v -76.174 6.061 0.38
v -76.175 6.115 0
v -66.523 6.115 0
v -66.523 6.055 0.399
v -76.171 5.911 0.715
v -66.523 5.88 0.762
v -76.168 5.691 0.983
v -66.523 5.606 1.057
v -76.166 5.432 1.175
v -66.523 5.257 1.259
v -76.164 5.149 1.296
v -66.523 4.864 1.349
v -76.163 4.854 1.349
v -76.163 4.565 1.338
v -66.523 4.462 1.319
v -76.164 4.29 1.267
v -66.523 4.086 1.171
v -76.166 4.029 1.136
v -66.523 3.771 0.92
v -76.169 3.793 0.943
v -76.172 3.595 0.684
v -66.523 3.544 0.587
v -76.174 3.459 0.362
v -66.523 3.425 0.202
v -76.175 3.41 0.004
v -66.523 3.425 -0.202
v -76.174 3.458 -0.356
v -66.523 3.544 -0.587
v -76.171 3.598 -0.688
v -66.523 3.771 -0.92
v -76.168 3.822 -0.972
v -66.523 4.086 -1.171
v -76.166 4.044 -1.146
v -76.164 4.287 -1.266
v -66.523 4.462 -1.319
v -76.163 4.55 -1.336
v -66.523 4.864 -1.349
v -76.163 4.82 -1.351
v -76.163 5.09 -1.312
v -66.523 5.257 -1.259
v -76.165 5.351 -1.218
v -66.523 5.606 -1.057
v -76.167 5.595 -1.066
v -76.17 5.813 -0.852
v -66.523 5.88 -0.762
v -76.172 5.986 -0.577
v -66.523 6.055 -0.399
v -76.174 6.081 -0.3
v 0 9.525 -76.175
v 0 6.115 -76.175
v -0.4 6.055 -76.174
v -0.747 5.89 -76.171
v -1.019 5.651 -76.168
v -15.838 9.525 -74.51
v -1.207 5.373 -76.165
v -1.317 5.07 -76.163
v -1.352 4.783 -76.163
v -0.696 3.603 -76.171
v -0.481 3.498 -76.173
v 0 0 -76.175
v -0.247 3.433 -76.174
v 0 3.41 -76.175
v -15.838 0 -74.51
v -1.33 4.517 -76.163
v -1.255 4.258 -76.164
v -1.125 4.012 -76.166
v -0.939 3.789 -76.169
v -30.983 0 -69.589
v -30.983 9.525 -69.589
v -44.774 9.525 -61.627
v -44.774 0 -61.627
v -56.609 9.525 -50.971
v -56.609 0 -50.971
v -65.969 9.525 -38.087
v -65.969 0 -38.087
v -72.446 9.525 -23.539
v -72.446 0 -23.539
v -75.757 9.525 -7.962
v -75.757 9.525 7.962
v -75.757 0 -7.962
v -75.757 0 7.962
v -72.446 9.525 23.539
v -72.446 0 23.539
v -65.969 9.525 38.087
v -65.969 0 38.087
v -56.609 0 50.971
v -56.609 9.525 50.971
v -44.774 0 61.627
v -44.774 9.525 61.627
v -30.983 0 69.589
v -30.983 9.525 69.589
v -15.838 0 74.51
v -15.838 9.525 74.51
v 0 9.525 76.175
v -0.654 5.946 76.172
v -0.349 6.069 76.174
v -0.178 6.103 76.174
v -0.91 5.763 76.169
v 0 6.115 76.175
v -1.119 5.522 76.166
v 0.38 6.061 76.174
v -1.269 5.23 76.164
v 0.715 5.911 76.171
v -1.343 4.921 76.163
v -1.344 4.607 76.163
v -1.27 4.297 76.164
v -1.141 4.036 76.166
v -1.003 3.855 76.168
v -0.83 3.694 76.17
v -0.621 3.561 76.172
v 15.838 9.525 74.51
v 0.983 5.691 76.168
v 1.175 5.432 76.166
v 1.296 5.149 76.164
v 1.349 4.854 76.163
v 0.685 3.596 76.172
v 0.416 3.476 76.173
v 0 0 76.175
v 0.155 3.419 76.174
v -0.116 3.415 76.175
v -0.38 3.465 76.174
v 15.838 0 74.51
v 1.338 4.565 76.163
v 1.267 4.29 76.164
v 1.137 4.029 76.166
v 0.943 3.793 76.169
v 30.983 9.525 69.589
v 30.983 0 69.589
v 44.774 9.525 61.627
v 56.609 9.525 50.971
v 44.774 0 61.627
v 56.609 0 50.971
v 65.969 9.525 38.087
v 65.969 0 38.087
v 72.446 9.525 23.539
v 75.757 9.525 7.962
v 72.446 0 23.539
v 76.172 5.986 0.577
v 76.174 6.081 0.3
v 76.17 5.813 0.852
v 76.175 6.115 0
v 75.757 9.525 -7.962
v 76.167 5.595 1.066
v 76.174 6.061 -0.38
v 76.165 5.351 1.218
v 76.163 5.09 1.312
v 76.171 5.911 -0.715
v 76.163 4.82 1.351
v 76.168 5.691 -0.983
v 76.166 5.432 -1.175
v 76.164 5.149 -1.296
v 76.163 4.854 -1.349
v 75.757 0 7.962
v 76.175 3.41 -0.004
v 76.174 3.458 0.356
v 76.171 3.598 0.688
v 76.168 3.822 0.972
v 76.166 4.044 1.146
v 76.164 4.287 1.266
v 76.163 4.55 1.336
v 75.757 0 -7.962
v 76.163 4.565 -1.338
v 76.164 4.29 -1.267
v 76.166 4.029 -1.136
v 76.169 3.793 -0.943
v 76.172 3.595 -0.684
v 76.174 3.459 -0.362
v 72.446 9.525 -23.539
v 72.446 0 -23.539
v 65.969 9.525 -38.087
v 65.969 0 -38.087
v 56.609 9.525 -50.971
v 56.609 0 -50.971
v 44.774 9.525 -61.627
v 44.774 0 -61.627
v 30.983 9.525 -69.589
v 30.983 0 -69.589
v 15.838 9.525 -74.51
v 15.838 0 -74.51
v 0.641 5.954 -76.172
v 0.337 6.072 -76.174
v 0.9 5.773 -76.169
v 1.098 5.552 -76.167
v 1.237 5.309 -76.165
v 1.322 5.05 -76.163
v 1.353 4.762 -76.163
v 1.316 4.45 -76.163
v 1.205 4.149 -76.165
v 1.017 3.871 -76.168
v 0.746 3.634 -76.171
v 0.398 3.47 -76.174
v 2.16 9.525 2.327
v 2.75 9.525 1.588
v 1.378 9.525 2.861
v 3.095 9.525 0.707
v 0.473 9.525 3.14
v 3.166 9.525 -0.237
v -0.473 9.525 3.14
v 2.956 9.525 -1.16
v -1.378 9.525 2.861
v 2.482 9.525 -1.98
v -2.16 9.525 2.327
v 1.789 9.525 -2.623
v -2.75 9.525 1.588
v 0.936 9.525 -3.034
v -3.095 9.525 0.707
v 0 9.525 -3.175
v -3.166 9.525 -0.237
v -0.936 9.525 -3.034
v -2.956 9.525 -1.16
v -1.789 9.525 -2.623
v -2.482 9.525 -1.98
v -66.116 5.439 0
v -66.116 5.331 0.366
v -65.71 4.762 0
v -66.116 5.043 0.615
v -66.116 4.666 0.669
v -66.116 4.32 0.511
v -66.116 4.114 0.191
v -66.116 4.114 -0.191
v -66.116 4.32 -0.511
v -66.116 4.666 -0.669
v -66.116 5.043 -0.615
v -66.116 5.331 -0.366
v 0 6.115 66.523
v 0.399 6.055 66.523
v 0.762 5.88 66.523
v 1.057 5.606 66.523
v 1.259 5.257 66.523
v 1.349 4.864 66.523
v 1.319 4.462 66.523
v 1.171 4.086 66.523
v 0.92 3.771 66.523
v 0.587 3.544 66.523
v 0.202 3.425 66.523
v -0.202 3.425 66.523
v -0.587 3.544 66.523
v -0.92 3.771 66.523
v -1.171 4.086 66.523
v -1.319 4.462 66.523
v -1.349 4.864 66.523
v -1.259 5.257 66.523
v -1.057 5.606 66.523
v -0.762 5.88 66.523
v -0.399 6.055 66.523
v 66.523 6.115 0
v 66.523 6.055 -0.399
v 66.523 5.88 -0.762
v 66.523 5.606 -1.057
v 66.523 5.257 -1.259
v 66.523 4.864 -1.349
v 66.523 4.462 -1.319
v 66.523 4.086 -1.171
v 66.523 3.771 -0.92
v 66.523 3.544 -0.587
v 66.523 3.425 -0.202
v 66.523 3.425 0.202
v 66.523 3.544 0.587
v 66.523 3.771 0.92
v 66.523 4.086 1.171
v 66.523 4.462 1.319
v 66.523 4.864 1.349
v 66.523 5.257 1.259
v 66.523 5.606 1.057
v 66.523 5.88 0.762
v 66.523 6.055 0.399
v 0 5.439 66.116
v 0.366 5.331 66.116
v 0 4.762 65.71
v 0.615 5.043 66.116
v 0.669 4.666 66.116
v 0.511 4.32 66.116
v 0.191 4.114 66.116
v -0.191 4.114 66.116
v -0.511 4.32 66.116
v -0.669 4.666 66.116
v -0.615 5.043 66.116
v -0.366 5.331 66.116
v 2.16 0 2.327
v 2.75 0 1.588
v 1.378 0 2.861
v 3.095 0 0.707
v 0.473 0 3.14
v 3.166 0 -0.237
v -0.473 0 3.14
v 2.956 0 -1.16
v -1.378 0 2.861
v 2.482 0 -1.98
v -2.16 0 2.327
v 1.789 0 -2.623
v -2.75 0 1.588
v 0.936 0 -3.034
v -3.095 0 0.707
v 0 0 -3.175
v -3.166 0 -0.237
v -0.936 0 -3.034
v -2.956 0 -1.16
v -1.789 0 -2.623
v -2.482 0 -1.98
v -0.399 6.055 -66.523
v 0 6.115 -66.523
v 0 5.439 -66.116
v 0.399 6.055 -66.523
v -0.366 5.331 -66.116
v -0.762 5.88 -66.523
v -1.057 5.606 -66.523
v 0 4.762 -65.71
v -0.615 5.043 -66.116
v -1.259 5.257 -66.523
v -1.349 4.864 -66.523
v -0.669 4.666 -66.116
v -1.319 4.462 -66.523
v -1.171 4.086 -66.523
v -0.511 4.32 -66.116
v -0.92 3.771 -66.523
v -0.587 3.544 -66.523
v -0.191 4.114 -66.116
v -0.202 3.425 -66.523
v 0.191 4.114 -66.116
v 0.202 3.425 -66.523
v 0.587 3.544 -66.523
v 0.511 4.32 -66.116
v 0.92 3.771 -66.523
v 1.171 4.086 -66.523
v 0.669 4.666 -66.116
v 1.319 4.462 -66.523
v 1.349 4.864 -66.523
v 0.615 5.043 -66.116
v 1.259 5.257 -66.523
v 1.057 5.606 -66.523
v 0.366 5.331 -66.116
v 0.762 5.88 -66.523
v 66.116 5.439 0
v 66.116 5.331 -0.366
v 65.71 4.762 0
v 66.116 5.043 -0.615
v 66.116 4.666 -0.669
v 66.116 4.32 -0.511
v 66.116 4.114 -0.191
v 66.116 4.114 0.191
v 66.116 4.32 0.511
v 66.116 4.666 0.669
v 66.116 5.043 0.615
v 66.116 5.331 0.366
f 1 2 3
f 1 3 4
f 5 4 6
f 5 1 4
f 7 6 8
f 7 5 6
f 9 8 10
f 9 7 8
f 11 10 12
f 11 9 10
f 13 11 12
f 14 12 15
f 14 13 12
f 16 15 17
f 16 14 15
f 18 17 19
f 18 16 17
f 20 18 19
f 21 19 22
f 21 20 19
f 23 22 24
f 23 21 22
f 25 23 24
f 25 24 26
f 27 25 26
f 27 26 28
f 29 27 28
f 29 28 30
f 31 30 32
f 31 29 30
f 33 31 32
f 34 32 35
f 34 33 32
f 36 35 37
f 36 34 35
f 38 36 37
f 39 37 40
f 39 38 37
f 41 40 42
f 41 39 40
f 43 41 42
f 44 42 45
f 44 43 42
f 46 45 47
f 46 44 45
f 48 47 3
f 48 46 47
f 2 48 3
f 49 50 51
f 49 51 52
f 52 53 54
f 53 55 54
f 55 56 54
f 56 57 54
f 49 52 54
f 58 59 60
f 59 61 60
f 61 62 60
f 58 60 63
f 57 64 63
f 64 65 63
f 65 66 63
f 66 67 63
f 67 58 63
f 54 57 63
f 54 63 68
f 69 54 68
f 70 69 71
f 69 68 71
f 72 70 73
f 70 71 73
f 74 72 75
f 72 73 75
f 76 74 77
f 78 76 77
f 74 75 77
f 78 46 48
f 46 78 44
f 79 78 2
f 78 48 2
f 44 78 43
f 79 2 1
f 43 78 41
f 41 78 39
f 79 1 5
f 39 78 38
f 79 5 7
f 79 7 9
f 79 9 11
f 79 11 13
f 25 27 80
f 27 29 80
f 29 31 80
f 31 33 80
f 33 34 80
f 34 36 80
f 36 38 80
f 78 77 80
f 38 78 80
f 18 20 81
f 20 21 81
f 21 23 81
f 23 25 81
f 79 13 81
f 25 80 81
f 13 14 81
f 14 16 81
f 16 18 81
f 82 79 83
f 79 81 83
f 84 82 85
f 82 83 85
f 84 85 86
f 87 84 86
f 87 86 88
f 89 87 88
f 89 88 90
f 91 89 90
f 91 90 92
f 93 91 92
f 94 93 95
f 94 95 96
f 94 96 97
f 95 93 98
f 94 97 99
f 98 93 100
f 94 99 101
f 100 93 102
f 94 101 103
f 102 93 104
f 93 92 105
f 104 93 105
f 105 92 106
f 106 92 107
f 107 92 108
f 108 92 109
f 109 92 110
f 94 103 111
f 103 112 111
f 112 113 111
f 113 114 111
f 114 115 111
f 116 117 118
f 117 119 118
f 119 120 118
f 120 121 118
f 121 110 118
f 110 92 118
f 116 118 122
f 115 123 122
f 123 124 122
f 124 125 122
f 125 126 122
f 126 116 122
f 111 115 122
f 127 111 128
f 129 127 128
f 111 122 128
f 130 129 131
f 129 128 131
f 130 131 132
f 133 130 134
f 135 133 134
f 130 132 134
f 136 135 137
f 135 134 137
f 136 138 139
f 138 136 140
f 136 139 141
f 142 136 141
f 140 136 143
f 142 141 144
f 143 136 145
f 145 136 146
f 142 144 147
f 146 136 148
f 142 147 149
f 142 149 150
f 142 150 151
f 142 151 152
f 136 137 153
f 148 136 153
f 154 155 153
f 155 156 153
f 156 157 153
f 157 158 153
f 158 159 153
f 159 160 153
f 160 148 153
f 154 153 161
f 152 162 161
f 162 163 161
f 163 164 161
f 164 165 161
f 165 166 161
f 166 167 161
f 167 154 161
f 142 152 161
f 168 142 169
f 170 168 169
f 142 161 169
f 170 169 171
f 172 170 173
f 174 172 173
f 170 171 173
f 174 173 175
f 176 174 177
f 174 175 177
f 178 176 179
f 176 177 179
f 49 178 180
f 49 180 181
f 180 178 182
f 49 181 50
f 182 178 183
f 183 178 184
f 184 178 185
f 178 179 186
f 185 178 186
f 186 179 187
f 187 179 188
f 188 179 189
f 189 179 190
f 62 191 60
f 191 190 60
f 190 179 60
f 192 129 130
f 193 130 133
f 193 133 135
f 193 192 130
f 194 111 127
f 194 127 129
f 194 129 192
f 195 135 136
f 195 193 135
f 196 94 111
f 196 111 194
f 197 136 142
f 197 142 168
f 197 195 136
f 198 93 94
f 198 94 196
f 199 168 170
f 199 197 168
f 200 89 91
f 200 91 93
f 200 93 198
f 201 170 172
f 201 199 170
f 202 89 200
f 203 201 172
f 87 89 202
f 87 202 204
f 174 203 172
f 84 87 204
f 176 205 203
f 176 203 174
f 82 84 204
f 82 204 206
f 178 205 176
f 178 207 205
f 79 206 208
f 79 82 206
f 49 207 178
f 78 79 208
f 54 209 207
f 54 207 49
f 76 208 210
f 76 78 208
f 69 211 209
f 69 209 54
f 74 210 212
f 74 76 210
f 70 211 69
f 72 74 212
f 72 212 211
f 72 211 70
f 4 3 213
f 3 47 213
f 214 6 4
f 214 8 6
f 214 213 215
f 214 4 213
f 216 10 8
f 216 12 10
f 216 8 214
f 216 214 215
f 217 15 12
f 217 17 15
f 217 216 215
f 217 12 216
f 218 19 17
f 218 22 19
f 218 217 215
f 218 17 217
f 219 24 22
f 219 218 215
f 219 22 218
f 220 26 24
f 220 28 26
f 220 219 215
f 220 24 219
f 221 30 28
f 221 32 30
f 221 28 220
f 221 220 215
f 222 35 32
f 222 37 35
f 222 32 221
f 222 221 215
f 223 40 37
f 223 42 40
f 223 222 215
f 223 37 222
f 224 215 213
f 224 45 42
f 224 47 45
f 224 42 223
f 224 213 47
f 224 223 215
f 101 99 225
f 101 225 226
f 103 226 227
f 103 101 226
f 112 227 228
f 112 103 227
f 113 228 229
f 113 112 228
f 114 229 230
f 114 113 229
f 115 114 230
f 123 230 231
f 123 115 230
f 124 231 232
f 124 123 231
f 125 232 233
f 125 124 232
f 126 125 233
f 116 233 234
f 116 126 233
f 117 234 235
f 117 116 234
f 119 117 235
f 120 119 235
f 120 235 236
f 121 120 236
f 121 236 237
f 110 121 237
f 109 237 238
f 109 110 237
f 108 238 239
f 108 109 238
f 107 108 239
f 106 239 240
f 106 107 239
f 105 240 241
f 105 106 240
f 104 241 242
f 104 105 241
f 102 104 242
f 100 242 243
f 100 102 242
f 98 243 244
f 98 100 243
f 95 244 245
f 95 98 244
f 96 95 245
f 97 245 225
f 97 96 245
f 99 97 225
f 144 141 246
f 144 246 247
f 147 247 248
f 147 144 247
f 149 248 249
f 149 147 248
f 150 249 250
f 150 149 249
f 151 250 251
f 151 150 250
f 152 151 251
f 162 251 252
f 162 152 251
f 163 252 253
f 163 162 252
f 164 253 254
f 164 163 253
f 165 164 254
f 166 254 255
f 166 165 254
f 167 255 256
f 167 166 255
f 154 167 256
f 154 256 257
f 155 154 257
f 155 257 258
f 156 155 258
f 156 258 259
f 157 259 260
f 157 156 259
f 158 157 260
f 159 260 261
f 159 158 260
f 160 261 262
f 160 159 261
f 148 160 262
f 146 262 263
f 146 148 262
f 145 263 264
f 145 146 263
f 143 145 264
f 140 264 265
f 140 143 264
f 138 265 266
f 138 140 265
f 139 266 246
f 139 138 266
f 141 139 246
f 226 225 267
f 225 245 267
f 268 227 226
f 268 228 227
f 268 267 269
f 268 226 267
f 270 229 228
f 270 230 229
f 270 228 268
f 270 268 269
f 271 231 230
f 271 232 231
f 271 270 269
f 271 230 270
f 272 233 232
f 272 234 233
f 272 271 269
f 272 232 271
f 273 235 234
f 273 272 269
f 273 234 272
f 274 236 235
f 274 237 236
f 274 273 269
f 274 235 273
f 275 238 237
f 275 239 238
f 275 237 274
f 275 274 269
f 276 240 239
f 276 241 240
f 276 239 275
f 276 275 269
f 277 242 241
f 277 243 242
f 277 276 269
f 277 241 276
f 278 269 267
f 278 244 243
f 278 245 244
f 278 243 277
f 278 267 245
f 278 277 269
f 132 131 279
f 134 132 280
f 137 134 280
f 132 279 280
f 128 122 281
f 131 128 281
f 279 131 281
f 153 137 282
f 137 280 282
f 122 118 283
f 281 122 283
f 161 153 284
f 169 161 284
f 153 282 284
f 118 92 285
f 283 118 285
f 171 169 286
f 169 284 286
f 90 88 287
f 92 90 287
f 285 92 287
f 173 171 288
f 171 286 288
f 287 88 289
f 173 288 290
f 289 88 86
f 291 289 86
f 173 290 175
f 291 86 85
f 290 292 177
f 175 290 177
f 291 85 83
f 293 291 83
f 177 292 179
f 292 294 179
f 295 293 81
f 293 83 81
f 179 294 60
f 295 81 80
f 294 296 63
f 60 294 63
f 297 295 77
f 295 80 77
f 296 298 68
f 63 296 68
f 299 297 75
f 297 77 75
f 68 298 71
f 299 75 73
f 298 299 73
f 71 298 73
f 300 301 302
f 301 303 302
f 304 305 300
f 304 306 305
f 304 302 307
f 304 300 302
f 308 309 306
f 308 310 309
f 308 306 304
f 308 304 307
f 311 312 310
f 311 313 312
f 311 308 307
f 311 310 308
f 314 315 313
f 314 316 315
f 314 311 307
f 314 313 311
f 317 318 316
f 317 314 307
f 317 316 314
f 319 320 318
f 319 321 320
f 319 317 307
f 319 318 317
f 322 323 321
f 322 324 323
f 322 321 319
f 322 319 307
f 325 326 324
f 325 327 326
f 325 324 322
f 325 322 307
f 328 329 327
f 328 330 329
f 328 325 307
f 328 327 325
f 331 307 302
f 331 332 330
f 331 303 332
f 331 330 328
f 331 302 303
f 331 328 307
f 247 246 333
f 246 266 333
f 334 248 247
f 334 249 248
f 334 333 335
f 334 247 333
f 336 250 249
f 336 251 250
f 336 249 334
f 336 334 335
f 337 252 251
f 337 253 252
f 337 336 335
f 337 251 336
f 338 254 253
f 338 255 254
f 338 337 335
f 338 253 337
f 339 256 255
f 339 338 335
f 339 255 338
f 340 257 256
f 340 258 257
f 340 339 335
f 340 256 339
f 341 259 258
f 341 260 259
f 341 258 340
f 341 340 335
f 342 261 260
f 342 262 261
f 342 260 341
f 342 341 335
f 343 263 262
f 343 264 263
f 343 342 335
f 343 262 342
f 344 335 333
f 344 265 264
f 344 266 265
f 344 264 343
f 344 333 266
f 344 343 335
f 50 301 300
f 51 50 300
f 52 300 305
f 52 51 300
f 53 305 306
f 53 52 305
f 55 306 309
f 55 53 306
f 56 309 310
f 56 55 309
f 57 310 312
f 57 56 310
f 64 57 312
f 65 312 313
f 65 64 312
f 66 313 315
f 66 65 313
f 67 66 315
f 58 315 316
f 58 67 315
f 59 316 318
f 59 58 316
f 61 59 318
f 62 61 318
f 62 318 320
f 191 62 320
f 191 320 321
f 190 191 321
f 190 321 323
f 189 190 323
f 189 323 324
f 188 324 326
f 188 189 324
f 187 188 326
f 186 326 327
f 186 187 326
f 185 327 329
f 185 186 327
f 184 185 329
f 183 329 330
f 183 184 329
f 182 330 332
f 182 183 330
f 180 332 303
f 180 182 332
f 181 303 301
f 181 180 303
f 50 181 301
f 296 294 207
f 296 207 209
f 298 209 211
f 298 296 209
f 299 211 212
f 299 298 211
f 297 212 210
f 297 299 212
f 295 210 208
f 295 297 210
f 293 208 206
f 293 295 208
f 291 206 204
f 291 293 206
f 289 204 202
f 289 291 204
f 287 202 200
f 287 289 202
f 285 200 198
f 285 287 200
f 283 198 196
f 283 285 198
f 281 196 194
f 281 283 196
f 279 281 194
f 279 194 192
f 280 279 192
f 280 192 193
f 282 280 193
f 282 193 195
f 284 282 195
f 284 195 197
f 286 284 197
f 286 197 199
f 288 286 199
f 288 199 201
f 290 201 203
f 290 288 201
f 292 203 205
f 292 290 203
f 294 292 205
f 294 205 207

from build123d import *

# Parameters (mm, degrees)
SKETCH1_R           = 76.1746
SKETCH1_R_2         = 3.175
BOSS_EXTRUDE1_DEPTH = 9.525
CIRPATTERN1_COUNT   = 4


with BuildPart() as part:
    # Sketch1 → Boss-Extrude1 (new body)
    with BuildSketch(Plane(origin=(0, 0, 0), x_dir=(1, 0, 0), z_dir=(0, 1, 0))):
        with Locations(Location((0, 0, 0), (0, 0, 90))):
            Circle(SKETCH1_R)
        with Locations(Location((0, 0, 0), (0, 0, 90))):
            Circle(SKETCH1_R_2, mode=Mode.SUBTRACT)
    extrude(amount=BOSS_EXTRUDE1_DEPTH)

    # Sketch3 → Tap Drill for #6-32 Tap1 (revolve, cut)
    with BuildSketch(Plane(origin=(0, 4.7625, -76.1746), x_dir=(0, 1, 0), z_dir=(1, 0, 0))):
        Polygon((0, 0), (0, 10.46469403), (1.35255, 9.652), (1.35255, 0), align=None)
    tap_drill_for_6_32_tap1 = revolve(axis=Axis((0, 4.7625, -82.5246), (0, 0, 1)), mode=Mode.SUBTRACT)

    # CirPattern1: Tap Drill for #6-32 Tap1 ×4 about axis
    cirpattern1_axis = Axis((0, 9.525, 0), (0, 1, 0))
    for i in range(1, CIRPATTERN1_COUNT):
        add(tap_drill_for_6_32_tap1.rotate(cirpattern1_axis, i * 360 / CIRPATTERN1_COUNT), mode=Mode.SUBTRACT)


solid = part.part
